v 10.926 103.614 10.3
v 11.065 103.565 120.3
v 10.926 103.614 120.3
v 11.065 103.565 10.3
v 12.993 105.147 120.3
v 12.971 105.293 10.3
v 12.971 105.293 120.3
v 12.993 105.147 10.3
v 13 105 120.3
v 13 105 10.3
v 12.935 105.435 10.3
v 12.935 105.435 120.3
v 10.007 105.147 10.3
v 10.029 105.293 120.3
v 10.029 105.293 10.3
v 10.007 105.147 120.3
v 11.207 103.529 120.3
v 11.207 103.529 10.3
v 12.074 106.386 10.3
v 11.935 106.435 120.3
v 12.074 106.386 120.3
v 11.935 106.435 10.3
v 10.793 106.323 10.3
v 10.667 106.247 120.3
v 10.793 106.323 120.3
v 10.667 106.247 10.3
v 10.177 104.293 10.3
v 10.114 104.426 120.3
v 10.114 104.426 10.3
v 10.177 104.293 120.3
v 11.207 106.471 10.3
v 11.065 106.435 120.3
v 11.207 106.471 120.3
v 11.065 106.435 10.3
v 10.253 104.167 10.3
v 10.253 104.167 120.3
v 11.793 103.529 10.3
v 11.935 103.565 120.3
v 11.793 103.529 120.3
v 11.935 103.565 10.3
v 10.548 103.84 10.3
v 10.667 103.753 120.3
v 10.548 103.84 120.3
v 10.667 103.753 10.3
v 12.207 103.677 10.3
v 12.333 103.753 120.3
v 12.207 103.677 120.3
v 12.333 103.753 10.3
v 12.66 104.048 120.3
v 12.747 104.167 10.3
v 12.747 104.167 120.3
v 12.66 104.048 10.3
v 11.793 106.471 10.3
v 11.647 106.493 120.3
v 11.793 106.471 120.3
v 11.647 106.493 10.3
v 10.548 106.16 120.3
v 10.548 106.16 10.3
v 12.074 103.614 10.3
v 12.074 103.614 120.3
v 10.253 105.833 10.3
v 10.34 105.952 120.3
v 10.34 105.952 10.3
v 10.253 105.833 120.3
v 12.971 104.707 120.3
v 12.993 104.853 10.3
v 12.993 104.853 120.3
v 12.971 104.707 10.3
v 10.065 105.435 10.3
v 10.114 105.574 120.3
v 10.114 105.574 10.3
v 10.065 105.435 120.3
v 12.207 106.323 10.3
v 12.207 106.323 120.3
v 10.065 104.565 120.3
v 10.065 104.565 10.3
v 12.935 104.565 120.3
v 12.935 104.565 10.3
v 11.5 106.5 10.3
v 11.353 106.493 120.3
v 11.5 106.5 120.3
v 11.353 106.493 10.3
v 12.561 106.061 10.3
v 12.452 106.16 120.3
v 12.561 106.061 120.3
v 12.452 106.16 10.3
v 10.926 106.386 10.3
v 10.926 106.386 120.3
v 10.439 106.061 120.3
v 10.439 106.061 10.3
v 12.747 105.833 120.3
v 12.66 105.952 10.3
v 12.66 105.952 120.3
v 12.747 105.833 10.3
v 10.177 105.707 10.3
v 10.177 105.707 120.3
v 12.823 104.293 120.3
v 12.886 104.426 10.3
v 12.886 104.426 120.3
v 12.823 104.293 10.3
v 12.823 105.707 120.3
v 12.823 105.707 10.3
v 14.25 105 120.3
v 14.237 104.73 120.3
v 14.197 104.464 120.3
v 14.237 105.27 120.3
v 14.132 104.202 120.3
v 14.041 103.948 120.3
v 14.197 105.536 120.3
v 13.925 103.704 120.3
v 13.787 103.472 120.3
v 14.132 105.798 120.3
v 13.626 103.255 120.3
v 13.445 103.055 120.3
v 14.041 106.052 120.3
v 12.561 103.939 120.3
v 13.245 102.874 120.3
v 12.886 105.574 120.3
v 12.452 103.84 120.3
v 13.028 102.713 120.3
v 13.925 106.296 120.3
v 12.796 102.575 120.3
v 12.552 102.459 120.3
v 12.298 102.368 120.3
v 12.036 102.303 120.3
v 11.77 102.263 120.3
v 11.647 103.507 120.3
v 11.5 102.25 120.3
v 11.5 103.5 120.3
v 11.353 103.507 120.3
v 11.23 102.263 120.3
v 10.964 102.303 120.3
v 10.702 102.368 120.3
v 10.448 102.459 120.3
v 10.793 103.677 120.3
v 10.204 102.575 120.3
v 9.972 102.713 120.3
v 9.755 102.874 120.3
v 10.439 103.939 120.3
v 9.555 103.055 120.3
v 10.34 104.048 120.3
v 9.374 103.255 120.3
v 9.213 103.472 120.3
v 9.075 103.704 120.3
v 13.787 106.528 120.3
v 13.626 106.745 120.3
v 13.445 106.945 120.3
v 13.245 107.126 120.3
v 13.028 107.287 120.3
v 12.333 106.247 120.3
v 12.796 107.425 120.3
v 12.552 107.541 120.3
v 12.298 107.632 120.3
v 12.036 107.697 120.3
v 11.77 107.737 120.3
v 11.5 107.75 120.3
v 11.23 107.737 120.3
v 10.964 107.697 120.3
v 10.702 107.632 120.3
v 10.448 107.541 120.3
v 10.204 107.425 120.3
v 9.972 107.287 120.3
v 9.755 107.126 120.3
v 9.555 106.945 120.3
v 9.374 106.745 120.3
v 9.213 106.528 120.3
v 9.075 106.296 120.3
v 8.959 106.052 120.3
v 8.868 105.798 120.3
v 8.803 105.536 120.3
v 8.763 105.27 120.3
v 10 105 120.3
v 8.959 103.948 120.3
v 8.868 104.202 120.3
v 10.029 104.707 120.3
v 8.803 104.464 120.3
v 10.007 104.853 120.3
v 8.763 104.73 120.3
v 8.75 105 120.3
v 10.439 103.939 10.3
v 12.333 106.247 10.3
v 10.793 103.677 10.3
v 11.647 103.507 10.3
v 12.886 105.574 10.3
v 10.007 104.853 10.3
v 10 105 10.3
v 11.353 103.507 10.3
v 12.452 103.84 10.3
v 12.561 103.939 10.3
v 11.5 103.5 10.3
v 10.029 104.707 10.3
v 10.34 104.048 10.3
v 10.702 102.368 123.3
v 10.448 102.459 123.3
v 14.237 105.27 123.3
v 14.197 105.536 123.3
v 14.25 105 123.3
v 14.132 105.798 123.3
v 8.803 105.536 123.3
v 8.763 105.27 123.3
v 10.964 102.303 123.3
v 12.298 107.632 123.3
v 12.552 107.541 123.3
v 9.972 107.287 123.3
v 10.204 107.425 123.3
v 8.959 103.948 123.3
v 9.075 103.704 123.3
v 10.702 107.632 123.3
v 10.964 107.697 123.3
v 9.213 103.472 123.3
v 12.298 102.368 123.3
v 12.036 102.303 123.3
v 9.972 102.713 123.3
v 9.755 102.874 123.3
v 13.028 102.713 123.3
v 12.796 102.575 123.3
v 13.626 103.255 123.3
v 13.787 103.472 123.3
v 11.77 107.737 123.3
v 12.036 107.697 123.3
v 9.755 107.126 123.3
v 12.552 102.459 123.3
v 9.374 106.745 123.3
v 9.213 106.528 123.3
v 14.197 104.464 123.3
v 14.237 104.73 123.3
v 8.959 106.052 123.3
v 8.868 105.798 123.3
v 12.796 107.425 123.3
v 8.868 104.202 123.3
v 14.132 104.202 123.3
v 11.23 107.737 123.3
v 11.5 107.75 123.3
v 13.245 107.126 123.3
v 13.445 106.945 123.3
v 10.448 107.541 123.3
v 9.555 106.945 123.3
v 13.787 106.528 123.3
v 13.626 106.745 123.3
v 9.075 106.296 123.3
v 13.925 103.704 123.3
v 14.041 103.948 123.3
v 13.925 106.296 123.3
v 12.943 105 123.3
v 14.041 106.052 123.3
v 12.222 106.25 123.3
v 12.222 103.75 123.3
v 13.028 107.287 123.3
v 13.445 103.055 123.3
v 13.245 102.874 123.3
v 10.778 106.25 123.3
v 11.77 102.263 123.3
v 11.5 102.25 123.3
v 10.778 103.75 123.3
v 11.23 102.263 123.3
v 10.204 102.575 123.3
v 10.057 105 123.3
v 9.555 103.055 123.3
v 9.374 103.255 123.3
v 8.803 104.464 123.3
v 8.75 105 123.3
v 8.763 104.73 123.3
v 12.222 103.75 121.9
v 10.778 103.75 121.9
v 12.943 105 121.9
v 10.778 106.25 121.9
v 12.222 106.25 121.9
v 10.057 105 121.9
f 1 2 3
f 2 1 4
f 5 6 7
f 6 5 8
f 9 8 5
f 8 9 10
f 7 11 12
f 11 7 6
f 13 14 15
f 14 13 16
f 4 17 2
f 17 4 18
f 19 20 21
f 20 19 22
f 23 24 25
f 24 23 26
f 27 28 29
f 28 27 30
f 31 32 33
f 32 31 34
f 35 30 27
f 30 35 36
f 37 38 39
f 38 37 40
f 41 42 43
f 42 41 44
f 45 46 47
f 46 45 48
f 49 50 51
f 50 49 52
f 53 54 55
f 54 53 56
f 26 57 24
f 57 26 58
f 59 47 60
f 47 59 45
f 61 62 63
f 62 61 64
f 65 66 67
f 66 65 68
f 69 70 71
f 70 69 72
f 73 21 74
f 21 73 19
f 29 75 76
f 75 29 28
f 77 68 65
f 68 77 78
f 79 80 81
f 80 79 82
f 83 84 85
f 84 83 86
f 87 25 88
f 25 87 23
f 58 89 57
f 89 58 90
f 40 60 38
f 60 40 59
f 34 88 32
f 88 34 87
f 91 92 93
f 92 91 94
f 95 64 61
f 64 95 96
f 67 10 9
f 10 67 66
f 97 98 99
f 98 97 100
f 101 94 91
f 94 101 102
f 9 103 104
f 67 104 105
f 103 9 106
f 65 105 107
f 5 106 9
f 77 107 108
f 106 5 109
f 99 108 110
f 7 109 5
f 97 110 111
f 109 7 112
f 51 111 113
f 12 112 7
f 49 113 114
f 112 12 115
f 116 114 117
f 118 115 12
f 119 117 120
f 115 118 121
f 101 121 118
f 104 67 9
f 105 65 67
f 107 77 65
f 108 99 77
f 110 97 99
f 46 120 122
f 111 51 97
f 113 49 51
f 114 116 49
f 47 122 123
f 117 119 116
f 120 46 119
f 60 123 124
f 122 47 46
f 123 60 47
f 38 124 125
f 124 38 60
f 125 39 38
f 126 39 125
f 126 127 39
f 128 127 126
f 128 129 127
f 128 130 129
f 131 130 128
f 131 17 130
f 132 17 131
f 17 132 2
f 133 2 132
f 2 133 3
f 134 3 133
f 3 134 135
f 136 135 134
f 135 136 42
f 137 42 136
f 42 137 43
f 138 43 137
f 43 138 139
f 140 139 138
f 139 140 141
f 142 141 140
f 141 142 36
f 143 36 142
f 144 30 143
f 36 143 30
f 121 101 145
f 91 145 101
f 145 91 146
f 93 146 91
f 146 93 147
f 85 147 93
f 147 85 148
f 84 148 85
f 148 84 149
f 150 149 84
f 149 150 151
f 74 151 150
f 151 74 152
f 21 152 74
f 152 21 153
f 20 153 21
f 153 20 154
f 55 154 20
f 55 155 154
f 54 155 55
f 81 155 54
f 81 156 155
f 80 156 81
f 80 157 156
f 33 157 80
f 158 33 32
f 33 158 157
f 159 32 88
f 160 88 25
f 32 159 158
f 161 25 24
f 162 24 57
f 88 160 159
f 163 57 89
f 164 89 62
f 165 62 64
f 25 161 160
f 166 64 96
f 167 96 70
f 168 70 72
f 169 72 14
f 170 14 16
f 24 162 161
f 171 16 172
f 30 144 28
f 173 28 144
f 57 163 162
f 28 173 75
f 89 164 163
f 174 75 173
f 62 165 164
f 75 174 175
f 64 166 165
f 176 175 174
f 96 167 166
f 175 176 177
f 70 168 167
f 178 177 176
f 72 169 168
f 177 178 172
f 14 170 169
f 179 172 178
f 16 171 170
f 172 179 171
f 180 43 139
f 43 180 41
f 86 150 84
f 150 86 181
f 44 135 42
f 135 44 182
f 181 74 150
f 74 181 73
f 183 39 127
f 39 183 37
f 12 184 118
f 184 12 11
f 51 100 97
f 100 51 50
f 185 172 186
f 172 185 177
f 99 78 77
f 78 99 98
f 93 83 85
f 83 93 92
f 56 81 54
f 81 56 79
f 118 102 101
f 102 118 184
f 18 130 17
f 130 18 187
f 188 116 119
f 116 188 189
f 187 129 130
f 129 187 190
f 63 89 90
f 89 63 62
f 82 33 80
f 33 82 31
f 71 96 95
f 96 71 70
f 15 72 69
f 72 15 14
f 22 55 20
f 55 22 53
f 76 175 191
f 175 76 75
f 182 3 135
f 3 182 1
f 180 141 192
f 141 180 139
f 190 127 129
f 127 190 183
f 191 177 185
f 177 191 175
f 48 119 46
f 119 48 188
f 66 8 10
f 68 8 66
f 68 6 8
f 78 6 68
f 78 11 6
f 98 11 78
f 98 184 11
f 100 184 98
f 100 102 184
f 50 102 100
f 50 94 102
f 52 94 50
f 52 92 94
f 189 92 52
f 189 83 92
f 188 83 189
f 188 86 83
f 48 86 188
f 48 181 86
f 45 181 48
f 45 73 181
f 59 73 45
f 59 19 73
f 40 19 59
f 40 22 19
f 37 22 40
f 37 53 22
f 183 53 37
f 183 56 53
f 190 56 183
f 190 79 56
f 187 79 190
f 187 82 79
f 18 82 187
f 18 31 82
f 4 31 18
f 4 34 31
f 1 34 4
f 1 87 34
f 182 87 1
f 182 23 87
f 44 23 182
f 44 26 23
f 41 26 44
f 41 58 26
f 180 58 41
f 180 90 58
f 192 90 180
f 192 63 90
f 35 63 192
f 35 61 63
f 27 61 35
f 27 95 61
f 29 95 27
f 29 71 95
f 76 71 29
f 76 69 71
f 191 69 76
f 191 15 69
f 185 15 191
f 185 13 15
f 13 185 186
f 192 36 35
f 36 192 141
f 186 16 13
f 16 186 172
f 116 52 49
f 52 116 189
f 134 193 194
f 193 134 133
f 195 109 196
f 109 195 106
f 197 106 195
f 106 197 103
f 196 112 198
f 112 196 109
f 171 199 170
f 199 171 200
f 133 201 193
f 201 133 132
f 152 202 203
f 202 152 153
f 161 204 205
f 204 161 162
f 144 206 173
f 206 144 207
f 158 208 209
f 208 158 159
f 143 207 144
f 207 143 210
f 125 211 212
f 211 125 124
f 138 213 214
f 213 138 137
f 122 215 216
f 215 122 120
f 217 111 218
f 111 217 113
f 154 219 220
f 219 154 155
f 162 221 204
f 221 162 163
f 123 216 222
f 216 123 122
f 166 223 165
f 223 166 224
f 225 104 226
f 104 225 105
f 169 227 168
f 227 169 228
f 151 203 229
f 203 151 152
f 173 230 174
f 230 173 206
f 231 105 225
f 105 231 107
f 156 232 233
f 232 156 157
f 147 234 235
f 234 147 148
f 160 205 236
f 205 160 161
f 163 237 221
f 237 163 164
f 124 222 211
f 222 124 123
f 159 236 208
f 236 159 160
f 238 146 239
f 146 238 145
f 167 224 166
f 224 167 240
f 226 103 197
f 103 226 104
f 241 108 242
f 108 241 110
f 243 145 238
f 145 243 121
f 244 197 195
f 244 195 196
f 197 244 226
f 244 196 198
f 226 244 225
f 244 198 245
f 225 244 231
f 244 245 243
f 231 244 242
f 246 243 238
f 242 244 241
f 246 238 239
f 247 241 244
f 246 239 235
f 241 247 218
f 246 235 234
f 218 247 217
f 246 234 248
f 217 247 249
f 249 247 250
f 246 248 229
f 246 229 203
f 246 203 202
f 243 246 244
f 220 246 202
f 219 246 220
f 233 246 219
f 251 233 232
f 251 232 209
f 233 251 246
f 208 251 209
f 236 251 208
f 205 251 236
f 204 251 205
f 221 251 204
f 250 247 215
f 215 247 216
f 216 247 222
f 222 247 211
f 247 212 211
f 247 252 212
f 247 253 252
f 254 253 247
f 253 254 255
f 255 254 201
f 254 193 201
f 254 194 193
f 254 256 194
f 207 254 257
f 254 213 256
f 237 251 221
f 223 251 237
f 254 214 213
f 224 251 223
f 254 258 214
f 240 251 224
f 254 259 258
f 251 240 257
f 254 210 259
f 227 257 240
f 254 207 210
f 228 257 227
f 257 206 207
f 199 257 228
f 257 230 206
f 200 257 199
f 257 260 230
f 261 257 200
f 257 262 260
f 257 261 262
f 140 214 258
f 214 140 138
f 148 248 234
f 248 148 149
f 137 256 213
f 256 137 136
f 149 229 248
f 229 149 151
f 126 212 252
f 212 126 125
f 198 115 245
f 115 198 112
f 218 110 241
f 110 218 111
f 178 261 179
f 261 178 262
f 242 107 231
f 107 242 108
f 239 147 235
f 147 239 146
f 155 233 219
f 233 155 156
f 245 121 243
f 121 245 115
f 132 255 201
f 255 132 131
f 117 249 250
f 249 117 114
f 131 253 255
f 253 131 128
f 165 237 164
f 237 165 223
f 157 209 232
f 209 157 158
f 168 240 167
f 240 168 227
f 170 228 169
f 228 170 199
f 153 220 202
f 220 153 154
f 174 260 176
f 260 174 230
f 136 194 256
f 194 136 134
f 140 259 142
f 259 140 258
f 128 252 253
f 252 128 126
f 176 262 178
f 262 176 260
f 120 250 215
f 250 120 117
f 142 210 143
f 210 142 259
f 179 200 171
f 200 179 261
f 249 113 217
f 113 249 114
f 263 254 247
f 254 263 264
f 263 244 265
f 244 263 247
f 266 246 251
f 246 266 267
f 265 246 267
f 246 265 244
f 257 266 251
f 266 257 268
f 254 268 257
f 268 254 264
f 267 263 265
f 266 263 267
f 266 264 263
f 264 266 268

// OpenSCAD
// Generated from the same CSG operations as STEP. Rebuild with spec/build_parent_hand_service.py.
difference(){union(){translate([11.5,105,10.3]) cylinder(r=1.5,h=110,$fn=64);translate([11.5,105,120.3]) cylinder(r=2.75,h=3,$fn=64);}translate([11.5,105,121.9]) cylinder(r=1.4433756729740643,h=1.5,$fn=6);}
